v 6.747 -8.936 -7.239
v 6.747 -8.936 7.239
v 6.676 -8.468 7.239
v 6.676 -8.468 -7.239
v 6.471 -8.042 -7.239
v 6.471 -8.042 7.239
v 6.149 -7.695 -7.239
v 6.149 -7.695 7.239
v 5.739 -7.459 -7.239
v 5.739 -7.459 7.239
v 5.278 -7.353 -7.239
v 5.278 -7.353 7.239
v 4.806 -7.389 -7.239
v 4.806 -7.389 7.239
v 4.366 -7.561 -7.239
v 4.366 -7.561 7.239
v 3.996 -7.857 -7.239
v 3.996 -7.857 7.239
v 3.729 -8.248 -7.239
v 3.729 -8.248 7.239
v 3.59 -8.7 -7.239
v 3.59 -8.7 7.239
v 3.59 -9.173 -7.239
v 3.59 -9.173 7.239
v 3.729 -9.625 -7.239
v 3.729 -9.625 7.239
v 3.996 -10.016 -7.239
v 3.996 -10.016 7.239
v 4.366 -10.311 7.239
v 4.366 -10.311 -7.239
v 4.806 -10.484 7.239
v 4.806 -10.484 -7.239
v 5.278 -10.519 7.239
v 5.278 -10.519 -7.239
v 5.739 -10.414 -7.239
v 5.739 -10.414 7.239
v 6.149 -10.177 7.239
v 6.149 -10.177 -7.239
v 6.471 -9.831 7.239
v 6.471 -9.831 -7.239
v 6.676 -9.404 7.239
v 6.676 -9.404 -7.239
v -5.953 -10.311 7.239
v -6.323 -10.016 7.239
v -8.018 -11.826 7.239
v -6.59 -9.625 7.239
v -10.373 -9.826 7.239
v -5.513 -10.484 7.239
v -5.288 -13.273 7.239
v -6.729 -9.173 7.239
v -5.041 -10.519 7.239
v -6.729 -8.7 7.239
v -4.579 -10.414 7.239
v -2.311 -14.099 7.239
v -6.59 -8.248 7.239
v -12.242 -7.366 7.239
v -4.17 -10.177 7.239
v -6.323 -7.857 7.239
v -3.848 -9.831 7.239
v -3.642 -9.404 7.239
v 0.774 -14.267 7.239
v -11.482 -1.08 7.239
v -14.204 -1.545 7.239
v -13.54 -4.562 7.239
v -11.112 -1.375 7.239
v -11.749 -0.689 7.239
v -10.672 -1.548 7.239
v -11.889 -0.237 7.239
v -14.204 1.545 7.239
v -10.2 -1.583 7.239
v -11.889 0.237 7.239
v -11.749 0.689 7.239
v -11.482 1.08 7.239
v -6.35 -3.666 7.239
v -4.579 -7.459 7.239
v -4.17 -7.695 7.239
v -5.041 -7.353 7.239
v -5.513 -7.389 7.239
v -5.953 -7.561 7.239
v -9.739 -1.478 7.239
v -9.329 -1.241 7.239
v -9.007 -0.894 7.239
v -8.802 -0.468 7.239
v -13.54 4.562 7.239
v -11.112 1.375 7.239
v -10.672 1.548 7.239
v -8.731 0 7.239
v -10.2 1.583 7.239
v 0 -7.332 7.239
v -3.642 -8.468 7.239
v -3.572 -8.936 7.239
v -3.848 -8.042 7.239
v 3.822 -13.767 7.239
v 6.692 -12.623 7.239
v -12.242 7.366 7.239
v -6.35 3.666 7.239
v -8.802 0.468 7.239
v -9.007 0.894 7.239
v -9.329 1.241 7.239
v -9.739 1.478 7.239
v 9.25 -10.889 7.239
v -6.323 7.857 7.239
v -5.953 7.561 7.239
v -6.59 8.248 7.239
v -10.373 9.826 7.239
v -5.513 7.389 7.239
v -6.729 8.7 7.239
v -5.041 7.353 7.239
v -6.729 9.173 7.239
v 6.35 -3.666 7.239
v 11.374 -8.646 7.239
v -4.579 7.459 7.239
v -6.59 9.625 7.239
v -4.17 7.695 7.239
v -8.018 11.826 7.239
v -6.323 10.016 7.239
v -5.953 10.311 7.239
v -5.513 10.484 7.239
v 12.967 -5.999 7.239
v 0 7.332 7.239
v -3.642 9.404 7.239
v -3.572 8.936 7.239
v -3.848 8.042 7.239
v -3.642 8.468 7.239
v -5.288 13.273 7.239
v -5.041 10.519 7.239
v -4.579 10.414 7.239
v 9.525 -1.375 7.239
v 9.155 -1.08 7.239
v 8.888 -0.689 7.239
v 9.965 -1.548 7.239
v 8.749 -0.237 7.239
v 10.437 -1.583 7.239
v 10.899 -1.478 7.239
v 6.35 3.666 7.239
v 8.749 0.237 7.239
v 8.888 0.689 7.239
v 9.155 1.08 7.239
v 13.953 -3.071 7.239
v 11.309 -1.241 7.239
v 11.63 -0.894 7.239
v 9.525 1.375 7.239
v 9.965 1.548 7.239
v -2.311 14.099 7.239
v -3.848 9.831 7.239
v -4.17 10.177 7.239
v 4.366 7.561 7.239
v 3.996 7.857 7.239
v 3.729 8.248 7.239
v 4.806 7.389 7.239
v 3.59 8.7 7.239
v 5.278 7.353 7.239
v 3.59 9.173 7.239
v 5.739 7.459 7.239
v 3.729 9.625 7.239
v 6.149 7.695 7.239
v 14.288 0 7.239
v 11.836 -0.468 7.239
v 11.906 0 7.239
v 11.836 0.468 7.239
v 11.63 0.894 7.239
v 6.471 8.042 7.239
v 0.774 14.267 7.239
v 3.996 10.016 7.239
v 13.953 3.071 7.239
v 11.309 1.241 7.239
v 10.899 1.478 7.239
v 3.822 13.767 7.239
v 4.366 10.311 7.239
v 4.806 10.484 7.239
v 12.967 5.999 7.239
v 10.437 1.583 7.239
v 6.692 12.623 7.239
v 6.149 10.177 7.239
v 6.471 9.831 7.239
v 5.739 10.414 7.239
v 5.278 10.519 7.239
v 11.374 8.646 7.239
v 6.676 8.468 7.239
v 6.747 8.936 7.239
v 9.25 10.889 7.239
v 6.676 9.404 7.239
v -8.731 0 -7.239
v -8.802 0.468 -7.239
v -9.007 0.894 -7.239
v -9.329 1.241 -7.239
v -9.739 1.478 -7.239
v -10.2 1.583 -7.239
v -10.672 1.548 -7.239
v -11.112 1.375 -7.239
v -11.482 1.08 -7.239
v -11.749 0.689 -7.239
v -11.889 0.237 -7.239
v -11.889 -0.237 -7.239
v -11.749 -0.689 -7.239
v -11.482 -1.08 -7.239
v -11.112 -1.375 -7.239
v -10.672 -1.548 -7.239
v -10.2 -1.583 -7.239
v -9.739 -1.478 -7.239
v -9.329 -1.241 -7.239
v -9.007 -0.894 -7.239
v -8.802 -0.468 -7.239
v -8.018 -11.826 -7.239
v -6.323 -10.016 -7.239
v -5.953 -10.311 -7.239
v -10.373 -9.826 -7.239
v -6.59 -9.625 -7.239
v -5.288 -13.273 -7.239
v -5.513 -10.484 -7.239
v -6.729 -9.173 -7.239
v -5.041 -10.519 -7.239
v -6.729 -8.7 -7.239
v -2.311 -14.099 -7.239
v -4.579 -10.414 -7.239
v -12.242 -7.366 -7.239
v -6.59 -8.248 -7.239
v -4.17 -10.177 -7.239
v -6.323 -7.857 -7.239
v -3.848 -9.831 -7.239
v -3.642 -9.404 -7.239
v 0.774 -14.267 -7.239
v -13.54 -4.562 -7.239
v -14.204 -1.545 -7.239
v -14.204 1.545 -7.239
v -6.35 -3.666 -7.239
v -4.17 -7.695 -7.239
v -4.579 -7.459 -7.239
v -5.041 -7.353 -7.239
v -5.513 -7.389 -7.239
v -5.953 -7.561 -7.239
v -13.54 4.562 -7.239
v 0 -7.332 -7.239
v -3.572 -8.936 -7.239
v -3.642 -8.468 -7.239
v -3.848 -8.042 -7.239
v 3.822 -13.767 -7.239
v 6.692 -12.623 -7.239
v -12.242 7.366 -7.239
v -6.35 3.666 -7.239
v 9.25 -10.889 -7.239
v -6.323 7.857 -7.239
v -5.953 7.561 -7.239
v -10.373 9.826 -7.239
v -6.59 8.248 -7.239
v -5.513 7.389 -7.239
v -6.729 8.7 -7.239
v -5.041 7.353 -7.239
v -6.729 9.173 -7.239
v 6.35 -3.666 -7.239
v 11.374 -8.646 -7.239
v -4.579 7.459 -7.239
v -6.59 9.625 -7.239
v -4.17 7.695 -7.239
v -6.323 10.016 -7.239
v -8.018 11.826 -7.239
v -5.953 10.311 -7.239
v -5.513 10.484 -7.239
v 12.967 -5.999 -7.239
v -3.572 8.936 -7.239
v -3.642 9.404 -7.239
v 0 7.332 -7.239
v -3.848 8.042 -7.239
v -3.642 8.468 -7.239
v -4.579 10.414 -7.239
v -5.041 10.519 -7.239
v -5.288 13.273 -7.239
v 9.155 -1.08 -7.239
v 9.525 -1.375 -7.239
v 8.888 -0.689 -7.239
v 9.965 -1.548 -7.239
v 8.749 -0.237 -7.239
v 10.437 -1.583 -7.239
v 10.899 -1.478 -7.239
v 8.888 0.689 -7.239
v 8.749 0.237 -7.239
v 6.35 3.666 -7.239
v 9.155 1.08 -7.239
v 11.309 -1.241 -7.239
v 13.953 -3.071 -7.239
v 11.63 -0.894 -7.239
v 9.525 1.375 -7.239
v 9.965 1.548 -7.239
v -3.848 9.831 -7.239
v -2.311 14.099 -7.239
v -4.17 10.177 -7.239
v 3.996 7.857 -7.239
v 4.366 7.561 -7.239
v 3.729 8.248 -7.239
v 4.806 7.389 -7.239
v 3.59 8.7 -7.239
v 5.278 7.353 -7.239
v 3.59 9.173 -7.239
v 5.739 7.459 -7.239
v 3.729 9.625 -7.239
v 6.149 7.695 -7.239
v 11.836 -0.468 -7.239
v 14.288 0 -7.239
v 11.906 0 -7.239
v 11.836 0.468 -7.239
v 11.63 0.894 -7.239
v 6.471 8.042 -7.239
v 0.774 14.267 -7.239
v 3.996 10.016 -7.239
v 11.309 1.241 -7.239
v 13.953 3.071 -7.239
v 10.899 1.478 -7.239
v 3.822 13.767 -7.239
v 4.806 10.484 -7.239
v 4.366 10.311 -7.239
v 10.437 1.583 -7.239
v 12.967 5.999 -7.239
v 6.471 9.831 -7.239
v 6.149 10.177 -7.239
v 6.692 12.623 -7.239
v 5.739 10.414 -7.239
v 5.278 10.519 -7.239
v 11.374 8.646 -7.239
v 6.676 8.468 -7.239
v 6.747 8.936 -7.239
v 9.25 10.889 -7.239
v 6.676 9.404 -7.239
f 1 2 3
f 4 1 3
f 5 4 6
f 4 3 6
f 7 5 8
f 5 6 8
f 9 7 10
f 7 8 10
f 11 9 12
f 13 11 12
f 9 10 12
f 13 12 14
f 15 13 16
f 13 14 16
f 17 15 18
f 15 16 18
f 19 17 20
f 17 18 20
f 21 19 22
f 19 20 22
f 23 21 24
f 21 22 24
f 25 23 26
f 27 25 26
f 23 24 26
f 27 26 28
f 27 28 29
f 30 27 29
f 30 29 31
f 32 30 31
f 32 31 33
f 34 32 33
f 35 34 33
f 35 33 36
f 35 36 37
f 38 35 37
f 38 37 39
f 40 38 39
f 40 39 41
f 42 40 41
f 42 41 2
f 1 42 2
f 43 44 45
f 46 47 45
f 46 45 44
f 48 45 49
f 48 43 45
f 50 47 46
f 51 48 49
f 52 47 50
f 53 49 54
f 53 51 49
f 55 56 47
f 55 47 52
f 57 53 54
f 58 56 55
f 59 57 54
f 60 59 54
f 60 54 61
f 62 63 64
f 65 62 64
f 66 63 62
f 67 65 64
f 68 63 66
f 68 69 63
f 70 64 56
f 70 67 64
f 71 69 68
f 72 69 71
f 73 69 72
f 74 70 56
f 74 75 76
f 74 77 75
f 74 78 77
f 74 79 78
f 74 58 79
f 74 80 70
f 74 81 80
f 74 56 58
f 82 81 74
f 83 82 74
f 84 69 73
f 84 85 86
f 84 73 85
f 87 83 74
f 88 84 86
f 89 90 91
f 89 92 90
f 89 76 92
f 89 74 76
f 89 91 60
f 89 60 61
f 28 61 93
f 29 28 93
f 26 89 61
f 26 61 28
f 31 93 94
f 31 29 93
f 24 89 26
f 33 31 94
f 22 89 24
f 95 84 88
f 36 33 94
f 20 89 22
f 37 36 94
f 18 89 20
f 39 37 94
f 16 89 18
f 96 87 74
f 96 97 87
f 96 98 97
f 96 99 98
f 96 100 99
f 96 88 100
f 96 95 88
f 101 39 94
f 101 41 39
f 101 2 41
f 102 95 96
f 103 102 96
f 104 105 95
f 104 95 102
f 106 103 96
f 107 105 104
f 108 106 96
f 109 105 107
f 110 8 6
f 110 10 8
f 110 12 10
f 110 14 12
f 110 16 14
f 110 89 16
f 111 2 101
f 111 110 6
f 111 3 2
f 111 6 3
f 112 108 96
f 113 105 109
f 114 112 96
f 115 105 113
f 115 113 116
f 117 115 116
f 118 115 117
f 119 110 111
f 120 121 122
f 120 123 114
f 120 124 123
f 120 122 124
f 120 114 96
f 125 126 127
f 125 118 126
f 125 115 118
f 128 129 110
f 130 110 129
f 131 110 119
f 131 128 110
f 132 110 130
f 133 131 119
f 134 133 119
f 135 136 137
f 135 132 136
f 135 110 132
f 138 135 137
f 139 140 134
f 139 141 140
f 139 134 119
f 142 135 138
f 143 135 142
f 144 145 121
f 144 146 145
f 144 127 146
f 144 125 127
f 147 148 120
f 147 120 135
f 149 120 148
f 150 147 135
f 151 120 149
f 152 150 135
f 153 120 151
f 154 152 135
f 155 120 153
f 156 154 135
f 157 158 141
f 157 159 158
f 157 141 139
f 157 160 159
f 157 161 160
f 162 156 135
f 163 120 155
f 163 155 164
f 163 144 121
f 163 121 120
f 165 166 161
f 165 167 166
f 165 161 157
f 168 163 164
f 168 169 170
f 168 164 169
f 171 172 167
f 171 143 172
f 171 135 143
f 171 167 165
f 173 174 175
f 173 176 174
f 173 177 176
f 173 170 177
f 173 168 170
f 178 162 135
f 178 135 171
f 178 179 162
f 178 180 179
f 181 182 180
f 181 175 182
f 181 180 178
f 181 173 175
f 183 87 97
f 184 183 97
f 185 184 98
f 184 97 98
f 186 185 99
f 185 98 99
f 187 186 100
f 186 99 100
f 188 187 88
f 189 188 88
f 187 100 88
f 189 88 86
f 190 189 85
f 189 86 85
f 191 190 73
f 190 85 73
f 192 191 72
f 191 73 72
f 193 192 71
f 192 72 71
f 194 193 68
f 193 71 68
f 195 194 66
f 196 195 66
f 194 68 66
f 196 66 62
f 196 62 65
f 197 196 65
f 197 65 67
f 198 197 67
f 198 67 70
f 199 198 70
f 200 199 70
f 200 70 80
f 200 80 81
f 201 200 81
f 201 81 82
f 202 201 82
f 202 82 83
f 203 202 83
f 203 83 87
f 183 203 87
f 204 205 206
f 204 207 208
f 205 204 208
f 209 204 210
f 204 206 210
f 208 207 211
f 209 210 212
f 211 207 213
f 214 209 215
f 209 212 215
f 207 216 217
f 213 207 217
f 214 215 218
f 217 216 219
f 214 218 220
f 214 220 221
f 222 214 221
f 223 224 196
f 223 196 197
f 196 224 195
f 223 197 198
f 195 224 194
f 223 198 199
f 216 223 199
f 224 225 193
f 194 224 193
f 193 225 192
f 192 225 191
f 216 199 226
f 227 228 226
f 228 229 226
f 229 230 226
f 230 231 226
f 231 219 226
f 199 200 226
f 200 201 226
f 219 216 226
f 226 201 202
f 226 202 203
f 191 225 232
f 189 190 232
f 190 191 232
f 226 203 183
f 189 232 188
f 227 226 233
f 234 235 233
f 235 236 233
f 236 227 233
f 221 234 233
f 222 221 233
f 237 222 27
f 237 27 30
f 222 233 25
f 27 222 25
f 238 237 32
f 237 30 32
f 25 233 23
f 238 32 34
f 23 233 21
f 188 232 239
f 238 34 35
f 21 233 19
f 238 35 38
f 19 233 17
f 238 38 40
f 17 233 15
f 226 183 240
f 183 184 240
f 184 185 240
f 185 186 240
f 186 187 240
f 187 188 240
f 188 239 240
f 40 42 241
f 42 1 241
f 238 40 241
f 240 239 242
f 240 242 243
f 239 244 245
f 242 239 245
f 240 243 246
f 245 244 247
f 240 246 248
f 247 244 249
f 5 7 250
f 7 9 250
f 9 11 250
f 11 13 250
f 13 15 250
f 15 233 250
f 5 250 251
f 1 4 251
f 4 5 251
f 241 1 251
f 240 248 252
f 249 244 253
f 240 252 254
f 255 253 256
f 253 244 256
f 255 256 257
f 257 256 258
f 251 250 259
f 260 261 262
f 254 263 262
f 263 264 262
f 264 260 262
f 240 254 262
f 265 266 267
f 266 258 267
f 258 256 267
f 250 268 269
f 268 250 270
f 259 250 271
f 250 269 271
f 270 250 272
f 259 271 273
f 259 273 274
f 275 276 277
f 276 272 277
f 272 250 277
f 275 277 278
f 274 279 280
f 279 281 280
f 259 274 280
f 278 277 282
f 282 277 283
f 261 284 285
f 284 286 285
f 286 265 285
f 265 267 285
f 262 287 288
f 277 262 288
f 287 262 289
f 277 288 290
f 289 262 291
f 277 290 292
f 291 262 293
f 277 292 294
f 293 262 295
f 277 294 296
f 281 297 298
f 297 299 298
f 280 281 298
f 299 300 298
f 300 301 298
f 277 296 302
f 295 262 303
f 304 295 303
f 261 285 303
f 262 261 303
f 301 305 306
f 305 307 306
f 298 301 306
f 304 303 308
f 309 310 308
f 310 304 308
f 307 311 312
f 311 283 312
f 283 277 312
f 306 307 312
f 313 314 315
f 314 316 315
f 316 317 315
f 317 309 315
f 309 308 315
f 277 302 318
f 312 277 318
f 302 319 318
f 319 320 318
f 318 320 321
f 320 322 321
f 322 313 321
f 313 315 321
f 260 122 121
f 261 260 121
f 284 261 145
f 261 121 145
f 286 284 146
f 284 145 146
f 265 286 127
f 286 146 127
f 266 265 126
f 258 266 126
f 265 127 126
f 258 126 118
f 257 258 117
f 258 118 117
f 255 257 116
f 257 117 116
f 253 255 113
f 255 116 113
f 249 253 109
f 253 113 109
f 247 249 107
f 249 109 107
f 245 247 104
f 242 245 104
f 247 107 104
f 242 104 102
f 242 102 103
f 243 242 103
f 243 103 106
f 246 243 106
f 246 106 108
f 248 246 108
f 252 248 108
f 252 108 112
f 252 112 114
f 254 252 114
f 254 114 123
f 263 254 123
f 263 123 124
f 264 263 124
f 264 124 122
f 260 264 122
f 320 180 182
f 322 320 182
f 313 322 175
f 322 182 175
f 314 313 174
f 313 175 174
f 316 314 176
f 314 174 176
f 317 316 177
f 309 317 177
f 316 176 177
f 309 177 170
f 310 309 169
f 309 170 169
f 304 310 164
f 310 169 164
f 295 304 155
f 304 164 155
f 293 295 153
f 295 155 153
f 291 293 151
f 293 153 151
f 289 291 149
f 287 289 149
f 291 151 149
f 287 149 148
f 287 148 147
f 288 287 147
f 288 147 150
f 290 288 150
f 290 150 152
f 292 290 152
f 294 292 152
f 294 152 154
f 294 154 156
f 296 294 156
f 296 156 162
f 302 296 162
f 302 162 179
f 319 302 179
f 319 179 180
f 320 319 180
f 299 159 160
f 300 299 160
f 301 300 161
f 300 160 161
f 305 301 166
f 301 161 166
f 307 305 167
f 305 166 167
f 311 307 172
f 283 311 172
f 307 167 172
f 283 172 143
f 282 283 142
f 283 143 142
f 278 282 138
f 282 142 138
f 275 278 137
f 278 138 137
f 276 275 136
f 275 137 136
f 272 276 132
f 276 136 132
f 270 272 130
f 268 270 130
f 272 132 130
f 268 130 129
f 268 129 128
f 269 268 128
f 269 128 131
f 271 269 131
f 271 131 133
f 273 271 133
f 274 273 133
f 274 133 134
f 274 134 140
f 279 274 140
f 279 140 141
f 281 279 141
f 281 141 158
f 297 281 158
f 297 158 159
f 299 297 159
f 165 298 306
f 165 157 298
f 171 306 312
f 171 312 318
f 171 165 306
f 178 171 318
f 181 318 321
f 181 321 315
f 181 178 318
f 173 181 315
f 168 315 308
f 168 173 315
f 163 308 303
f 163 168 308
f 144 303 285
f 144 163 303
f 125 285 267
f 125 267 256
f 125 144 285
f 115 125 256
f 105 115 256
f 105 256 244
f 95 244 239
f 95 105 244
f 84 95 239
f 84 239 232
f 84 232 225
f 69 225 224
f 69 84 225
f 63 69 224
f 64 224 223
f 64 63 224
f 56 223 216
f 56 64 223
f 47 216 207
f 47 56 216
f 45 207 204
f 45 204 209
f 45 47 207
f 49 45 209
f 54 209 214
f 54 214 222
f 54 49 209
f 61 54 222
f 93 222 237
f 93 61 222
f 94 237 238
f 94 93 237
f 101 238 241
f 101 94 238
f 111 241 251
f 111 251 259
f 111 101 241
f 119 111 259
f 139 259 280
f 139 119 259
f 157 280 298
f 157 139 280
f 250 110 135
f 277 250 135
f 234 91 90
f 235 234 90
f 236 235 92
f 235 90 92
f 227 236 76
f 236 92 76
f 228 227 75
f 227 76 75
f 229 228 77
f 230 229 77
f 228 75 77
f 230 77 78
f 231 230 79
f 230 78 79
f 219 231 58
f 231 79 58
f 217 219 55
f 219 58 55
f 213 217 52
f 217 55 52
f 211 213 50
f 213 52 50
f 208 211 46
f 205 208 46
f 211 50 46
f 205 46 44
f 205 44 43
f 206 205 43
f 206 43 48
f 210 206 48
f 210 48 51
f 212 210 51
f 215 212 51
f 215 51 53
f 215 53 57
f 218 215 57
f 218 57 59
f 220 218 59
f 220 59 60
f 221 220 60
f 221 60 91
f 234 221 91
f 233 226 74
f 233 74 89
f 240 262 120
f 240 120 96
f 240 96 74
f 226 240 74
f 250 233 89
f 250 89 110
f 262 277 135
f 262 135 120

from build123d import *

# Parameters (mm, degrees)
SKETCH1_R           = 14.2875
BOSS_EXTRUDE1_DEPTH = 7.239
SKETCH2_R           = 1.5875
CUT_EXTRUDE1_DEPTH  = 25.857147795


with BuildPart() as part:
    # Sketch1 → Boss-Extrude1 (new, symmetric)
    with BuildSketch(Plane.XY):
        Circle(SKETCH1_R)
    extrude(amount=BOSS_EXTRUDE1_DEPTH, both=True)

    # Sketch2 → Cut-Extrude1 (cut, through all)
    with BuildSketch(Plane.XY.offset(7.239)):
        with Locations((-10.31875, 0)):
            Circle(SKETCH2_R)
        with Locations((-5.159375, 8.936299635)):
            Circle(SKETCH2_R)
        with Locations((5.159375, 8.936299635)):
            Circle(SKETCH2_R)
        with Locations((10.31875, 0)):
            Circle(SKETCH2_R)
        with Locations((5.159375, -8.936299635)):
            Circle(SKETCH2_R)
        with Locations((-5.159375, -8.936299635)):
            Circle(SKETCH2_R)
        Polygon((0, 7.332348419), (-6.35, 3.666174209), (-6.35, -3.666174209), (0, -7.332348419), (6.35, -3.666174209), (6.35, 3.666174209), align=None)
    extrude(amount=-CUT_EXTRUDE1_DEPTH, mode=Mode.SUBTRACT)


solid = part.part
